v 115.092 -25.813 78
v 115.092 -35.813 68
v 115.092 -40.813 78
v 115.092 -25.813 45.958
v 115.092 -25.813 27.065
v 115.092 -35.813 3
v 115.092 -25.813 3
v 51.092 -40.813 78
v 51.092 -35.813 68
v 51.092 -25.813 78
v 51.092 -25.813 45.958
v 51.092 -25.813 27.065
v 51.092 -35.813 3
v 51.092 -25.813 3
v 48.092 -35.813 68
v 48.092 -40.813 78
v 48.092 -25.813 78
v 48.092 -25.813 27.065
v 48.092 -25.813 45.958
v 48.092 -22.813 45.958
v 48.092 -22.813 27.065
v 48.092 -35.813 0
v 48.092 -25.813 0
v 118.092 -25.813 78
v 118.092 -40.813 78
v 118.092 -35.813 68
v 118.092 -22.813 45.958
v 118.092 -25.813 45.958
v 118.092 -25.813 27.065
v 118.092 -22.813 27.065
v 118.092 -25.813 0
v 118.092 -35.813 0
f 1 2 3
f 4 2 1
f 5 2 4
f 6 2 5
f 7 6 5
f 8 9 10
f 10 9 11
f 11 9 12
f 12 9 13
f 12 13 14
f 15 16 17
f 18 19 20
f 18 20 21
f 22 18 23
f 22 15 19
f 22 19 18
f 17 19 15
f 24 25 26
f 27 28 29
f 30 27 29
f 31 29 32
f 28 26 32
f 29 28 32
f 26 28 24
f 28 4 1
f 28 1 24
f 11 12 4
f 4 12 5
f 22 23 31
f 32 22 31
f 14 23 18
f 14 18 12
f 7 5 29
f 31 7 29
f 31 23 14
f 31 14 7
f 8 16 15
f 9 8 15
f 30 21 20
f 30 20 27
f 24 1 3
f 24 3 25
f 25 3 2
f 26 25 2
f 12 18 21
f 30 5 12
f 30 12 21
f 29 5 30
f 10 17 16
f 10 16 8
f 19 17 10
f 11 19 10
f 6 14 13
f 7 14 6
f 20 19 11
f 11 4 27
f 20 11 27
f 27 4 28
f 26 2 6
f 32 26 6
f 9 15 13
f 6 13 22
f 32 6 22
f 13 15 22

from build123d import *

# Parameters (mm, degrees)
SKETCH1_W           = 70
SKETCH1_H           = 15
BOSS_EXTRUDE1_DEPTH = 3
SKETCH2_W           = 3
SKETCH2_H           = 15
BOSS_EXTRUDE2_DEPTH = 75
CUT_EXTRUDE1_DEPTH  = 75
SKETCH4_W           = 70
SKETCH4_H           = 18.892094127
BOSS_EXTRUDE3_DEPTH = 3


with BuildPart() as part:
    # Sketch1 → Boss-Extrude1 (new body)
    with BuildSketch(Plane.XY):
        with Locations((83.09202796, -33.31343354)):
            Rectangle(SKETCH1_W, SKETCH1_H)
    extrude(amount=BOSS_EXTRUDE1_DEPTH)

    # Sketch2 → Boss-Extrude2 (add)
    with BuildSketch(Plane.XY.offset(3)):
        with Locations((49.59202796, -33.31343354)):
            Rectangle(SKETCH2_W, SKETCH2_H)
        with Locations((116.59202796, -33.31343354)):
            Rectangle(SKETCH2_W, SKETCH2_H)
    extrude(amount=BOSS_EXTRUDE2_DEPTH)

    # Sketch3 → Cut-Extrude1 (cut)
    with BuildSketch(Plane.ZY.offset(-48.09202796)):
        Polygon((0, -40.81343354), (78, -40.81343354), (68, -35.81343354), (0, -35.81343354), align=None)
    extrude(amount=-CUT_EXTRUDE1_DEPTH, mode=Mode.SUBTRACT)

    # Sketch4 → Boss-Extrude3 (add)
    with BuildSketch(Plane(origin=(0, -25.81343354, 0), x_dir=(1, 0, 0), z_dir=(0, 1, 0))):
        with Locations((83.09202796, -36.511528279)):
            Rectangle(SKETCH4_W, SKETCH4_H)
    extrude(amount=BOSS_EXTRUDE3_DEPTH)


solid = part.part
